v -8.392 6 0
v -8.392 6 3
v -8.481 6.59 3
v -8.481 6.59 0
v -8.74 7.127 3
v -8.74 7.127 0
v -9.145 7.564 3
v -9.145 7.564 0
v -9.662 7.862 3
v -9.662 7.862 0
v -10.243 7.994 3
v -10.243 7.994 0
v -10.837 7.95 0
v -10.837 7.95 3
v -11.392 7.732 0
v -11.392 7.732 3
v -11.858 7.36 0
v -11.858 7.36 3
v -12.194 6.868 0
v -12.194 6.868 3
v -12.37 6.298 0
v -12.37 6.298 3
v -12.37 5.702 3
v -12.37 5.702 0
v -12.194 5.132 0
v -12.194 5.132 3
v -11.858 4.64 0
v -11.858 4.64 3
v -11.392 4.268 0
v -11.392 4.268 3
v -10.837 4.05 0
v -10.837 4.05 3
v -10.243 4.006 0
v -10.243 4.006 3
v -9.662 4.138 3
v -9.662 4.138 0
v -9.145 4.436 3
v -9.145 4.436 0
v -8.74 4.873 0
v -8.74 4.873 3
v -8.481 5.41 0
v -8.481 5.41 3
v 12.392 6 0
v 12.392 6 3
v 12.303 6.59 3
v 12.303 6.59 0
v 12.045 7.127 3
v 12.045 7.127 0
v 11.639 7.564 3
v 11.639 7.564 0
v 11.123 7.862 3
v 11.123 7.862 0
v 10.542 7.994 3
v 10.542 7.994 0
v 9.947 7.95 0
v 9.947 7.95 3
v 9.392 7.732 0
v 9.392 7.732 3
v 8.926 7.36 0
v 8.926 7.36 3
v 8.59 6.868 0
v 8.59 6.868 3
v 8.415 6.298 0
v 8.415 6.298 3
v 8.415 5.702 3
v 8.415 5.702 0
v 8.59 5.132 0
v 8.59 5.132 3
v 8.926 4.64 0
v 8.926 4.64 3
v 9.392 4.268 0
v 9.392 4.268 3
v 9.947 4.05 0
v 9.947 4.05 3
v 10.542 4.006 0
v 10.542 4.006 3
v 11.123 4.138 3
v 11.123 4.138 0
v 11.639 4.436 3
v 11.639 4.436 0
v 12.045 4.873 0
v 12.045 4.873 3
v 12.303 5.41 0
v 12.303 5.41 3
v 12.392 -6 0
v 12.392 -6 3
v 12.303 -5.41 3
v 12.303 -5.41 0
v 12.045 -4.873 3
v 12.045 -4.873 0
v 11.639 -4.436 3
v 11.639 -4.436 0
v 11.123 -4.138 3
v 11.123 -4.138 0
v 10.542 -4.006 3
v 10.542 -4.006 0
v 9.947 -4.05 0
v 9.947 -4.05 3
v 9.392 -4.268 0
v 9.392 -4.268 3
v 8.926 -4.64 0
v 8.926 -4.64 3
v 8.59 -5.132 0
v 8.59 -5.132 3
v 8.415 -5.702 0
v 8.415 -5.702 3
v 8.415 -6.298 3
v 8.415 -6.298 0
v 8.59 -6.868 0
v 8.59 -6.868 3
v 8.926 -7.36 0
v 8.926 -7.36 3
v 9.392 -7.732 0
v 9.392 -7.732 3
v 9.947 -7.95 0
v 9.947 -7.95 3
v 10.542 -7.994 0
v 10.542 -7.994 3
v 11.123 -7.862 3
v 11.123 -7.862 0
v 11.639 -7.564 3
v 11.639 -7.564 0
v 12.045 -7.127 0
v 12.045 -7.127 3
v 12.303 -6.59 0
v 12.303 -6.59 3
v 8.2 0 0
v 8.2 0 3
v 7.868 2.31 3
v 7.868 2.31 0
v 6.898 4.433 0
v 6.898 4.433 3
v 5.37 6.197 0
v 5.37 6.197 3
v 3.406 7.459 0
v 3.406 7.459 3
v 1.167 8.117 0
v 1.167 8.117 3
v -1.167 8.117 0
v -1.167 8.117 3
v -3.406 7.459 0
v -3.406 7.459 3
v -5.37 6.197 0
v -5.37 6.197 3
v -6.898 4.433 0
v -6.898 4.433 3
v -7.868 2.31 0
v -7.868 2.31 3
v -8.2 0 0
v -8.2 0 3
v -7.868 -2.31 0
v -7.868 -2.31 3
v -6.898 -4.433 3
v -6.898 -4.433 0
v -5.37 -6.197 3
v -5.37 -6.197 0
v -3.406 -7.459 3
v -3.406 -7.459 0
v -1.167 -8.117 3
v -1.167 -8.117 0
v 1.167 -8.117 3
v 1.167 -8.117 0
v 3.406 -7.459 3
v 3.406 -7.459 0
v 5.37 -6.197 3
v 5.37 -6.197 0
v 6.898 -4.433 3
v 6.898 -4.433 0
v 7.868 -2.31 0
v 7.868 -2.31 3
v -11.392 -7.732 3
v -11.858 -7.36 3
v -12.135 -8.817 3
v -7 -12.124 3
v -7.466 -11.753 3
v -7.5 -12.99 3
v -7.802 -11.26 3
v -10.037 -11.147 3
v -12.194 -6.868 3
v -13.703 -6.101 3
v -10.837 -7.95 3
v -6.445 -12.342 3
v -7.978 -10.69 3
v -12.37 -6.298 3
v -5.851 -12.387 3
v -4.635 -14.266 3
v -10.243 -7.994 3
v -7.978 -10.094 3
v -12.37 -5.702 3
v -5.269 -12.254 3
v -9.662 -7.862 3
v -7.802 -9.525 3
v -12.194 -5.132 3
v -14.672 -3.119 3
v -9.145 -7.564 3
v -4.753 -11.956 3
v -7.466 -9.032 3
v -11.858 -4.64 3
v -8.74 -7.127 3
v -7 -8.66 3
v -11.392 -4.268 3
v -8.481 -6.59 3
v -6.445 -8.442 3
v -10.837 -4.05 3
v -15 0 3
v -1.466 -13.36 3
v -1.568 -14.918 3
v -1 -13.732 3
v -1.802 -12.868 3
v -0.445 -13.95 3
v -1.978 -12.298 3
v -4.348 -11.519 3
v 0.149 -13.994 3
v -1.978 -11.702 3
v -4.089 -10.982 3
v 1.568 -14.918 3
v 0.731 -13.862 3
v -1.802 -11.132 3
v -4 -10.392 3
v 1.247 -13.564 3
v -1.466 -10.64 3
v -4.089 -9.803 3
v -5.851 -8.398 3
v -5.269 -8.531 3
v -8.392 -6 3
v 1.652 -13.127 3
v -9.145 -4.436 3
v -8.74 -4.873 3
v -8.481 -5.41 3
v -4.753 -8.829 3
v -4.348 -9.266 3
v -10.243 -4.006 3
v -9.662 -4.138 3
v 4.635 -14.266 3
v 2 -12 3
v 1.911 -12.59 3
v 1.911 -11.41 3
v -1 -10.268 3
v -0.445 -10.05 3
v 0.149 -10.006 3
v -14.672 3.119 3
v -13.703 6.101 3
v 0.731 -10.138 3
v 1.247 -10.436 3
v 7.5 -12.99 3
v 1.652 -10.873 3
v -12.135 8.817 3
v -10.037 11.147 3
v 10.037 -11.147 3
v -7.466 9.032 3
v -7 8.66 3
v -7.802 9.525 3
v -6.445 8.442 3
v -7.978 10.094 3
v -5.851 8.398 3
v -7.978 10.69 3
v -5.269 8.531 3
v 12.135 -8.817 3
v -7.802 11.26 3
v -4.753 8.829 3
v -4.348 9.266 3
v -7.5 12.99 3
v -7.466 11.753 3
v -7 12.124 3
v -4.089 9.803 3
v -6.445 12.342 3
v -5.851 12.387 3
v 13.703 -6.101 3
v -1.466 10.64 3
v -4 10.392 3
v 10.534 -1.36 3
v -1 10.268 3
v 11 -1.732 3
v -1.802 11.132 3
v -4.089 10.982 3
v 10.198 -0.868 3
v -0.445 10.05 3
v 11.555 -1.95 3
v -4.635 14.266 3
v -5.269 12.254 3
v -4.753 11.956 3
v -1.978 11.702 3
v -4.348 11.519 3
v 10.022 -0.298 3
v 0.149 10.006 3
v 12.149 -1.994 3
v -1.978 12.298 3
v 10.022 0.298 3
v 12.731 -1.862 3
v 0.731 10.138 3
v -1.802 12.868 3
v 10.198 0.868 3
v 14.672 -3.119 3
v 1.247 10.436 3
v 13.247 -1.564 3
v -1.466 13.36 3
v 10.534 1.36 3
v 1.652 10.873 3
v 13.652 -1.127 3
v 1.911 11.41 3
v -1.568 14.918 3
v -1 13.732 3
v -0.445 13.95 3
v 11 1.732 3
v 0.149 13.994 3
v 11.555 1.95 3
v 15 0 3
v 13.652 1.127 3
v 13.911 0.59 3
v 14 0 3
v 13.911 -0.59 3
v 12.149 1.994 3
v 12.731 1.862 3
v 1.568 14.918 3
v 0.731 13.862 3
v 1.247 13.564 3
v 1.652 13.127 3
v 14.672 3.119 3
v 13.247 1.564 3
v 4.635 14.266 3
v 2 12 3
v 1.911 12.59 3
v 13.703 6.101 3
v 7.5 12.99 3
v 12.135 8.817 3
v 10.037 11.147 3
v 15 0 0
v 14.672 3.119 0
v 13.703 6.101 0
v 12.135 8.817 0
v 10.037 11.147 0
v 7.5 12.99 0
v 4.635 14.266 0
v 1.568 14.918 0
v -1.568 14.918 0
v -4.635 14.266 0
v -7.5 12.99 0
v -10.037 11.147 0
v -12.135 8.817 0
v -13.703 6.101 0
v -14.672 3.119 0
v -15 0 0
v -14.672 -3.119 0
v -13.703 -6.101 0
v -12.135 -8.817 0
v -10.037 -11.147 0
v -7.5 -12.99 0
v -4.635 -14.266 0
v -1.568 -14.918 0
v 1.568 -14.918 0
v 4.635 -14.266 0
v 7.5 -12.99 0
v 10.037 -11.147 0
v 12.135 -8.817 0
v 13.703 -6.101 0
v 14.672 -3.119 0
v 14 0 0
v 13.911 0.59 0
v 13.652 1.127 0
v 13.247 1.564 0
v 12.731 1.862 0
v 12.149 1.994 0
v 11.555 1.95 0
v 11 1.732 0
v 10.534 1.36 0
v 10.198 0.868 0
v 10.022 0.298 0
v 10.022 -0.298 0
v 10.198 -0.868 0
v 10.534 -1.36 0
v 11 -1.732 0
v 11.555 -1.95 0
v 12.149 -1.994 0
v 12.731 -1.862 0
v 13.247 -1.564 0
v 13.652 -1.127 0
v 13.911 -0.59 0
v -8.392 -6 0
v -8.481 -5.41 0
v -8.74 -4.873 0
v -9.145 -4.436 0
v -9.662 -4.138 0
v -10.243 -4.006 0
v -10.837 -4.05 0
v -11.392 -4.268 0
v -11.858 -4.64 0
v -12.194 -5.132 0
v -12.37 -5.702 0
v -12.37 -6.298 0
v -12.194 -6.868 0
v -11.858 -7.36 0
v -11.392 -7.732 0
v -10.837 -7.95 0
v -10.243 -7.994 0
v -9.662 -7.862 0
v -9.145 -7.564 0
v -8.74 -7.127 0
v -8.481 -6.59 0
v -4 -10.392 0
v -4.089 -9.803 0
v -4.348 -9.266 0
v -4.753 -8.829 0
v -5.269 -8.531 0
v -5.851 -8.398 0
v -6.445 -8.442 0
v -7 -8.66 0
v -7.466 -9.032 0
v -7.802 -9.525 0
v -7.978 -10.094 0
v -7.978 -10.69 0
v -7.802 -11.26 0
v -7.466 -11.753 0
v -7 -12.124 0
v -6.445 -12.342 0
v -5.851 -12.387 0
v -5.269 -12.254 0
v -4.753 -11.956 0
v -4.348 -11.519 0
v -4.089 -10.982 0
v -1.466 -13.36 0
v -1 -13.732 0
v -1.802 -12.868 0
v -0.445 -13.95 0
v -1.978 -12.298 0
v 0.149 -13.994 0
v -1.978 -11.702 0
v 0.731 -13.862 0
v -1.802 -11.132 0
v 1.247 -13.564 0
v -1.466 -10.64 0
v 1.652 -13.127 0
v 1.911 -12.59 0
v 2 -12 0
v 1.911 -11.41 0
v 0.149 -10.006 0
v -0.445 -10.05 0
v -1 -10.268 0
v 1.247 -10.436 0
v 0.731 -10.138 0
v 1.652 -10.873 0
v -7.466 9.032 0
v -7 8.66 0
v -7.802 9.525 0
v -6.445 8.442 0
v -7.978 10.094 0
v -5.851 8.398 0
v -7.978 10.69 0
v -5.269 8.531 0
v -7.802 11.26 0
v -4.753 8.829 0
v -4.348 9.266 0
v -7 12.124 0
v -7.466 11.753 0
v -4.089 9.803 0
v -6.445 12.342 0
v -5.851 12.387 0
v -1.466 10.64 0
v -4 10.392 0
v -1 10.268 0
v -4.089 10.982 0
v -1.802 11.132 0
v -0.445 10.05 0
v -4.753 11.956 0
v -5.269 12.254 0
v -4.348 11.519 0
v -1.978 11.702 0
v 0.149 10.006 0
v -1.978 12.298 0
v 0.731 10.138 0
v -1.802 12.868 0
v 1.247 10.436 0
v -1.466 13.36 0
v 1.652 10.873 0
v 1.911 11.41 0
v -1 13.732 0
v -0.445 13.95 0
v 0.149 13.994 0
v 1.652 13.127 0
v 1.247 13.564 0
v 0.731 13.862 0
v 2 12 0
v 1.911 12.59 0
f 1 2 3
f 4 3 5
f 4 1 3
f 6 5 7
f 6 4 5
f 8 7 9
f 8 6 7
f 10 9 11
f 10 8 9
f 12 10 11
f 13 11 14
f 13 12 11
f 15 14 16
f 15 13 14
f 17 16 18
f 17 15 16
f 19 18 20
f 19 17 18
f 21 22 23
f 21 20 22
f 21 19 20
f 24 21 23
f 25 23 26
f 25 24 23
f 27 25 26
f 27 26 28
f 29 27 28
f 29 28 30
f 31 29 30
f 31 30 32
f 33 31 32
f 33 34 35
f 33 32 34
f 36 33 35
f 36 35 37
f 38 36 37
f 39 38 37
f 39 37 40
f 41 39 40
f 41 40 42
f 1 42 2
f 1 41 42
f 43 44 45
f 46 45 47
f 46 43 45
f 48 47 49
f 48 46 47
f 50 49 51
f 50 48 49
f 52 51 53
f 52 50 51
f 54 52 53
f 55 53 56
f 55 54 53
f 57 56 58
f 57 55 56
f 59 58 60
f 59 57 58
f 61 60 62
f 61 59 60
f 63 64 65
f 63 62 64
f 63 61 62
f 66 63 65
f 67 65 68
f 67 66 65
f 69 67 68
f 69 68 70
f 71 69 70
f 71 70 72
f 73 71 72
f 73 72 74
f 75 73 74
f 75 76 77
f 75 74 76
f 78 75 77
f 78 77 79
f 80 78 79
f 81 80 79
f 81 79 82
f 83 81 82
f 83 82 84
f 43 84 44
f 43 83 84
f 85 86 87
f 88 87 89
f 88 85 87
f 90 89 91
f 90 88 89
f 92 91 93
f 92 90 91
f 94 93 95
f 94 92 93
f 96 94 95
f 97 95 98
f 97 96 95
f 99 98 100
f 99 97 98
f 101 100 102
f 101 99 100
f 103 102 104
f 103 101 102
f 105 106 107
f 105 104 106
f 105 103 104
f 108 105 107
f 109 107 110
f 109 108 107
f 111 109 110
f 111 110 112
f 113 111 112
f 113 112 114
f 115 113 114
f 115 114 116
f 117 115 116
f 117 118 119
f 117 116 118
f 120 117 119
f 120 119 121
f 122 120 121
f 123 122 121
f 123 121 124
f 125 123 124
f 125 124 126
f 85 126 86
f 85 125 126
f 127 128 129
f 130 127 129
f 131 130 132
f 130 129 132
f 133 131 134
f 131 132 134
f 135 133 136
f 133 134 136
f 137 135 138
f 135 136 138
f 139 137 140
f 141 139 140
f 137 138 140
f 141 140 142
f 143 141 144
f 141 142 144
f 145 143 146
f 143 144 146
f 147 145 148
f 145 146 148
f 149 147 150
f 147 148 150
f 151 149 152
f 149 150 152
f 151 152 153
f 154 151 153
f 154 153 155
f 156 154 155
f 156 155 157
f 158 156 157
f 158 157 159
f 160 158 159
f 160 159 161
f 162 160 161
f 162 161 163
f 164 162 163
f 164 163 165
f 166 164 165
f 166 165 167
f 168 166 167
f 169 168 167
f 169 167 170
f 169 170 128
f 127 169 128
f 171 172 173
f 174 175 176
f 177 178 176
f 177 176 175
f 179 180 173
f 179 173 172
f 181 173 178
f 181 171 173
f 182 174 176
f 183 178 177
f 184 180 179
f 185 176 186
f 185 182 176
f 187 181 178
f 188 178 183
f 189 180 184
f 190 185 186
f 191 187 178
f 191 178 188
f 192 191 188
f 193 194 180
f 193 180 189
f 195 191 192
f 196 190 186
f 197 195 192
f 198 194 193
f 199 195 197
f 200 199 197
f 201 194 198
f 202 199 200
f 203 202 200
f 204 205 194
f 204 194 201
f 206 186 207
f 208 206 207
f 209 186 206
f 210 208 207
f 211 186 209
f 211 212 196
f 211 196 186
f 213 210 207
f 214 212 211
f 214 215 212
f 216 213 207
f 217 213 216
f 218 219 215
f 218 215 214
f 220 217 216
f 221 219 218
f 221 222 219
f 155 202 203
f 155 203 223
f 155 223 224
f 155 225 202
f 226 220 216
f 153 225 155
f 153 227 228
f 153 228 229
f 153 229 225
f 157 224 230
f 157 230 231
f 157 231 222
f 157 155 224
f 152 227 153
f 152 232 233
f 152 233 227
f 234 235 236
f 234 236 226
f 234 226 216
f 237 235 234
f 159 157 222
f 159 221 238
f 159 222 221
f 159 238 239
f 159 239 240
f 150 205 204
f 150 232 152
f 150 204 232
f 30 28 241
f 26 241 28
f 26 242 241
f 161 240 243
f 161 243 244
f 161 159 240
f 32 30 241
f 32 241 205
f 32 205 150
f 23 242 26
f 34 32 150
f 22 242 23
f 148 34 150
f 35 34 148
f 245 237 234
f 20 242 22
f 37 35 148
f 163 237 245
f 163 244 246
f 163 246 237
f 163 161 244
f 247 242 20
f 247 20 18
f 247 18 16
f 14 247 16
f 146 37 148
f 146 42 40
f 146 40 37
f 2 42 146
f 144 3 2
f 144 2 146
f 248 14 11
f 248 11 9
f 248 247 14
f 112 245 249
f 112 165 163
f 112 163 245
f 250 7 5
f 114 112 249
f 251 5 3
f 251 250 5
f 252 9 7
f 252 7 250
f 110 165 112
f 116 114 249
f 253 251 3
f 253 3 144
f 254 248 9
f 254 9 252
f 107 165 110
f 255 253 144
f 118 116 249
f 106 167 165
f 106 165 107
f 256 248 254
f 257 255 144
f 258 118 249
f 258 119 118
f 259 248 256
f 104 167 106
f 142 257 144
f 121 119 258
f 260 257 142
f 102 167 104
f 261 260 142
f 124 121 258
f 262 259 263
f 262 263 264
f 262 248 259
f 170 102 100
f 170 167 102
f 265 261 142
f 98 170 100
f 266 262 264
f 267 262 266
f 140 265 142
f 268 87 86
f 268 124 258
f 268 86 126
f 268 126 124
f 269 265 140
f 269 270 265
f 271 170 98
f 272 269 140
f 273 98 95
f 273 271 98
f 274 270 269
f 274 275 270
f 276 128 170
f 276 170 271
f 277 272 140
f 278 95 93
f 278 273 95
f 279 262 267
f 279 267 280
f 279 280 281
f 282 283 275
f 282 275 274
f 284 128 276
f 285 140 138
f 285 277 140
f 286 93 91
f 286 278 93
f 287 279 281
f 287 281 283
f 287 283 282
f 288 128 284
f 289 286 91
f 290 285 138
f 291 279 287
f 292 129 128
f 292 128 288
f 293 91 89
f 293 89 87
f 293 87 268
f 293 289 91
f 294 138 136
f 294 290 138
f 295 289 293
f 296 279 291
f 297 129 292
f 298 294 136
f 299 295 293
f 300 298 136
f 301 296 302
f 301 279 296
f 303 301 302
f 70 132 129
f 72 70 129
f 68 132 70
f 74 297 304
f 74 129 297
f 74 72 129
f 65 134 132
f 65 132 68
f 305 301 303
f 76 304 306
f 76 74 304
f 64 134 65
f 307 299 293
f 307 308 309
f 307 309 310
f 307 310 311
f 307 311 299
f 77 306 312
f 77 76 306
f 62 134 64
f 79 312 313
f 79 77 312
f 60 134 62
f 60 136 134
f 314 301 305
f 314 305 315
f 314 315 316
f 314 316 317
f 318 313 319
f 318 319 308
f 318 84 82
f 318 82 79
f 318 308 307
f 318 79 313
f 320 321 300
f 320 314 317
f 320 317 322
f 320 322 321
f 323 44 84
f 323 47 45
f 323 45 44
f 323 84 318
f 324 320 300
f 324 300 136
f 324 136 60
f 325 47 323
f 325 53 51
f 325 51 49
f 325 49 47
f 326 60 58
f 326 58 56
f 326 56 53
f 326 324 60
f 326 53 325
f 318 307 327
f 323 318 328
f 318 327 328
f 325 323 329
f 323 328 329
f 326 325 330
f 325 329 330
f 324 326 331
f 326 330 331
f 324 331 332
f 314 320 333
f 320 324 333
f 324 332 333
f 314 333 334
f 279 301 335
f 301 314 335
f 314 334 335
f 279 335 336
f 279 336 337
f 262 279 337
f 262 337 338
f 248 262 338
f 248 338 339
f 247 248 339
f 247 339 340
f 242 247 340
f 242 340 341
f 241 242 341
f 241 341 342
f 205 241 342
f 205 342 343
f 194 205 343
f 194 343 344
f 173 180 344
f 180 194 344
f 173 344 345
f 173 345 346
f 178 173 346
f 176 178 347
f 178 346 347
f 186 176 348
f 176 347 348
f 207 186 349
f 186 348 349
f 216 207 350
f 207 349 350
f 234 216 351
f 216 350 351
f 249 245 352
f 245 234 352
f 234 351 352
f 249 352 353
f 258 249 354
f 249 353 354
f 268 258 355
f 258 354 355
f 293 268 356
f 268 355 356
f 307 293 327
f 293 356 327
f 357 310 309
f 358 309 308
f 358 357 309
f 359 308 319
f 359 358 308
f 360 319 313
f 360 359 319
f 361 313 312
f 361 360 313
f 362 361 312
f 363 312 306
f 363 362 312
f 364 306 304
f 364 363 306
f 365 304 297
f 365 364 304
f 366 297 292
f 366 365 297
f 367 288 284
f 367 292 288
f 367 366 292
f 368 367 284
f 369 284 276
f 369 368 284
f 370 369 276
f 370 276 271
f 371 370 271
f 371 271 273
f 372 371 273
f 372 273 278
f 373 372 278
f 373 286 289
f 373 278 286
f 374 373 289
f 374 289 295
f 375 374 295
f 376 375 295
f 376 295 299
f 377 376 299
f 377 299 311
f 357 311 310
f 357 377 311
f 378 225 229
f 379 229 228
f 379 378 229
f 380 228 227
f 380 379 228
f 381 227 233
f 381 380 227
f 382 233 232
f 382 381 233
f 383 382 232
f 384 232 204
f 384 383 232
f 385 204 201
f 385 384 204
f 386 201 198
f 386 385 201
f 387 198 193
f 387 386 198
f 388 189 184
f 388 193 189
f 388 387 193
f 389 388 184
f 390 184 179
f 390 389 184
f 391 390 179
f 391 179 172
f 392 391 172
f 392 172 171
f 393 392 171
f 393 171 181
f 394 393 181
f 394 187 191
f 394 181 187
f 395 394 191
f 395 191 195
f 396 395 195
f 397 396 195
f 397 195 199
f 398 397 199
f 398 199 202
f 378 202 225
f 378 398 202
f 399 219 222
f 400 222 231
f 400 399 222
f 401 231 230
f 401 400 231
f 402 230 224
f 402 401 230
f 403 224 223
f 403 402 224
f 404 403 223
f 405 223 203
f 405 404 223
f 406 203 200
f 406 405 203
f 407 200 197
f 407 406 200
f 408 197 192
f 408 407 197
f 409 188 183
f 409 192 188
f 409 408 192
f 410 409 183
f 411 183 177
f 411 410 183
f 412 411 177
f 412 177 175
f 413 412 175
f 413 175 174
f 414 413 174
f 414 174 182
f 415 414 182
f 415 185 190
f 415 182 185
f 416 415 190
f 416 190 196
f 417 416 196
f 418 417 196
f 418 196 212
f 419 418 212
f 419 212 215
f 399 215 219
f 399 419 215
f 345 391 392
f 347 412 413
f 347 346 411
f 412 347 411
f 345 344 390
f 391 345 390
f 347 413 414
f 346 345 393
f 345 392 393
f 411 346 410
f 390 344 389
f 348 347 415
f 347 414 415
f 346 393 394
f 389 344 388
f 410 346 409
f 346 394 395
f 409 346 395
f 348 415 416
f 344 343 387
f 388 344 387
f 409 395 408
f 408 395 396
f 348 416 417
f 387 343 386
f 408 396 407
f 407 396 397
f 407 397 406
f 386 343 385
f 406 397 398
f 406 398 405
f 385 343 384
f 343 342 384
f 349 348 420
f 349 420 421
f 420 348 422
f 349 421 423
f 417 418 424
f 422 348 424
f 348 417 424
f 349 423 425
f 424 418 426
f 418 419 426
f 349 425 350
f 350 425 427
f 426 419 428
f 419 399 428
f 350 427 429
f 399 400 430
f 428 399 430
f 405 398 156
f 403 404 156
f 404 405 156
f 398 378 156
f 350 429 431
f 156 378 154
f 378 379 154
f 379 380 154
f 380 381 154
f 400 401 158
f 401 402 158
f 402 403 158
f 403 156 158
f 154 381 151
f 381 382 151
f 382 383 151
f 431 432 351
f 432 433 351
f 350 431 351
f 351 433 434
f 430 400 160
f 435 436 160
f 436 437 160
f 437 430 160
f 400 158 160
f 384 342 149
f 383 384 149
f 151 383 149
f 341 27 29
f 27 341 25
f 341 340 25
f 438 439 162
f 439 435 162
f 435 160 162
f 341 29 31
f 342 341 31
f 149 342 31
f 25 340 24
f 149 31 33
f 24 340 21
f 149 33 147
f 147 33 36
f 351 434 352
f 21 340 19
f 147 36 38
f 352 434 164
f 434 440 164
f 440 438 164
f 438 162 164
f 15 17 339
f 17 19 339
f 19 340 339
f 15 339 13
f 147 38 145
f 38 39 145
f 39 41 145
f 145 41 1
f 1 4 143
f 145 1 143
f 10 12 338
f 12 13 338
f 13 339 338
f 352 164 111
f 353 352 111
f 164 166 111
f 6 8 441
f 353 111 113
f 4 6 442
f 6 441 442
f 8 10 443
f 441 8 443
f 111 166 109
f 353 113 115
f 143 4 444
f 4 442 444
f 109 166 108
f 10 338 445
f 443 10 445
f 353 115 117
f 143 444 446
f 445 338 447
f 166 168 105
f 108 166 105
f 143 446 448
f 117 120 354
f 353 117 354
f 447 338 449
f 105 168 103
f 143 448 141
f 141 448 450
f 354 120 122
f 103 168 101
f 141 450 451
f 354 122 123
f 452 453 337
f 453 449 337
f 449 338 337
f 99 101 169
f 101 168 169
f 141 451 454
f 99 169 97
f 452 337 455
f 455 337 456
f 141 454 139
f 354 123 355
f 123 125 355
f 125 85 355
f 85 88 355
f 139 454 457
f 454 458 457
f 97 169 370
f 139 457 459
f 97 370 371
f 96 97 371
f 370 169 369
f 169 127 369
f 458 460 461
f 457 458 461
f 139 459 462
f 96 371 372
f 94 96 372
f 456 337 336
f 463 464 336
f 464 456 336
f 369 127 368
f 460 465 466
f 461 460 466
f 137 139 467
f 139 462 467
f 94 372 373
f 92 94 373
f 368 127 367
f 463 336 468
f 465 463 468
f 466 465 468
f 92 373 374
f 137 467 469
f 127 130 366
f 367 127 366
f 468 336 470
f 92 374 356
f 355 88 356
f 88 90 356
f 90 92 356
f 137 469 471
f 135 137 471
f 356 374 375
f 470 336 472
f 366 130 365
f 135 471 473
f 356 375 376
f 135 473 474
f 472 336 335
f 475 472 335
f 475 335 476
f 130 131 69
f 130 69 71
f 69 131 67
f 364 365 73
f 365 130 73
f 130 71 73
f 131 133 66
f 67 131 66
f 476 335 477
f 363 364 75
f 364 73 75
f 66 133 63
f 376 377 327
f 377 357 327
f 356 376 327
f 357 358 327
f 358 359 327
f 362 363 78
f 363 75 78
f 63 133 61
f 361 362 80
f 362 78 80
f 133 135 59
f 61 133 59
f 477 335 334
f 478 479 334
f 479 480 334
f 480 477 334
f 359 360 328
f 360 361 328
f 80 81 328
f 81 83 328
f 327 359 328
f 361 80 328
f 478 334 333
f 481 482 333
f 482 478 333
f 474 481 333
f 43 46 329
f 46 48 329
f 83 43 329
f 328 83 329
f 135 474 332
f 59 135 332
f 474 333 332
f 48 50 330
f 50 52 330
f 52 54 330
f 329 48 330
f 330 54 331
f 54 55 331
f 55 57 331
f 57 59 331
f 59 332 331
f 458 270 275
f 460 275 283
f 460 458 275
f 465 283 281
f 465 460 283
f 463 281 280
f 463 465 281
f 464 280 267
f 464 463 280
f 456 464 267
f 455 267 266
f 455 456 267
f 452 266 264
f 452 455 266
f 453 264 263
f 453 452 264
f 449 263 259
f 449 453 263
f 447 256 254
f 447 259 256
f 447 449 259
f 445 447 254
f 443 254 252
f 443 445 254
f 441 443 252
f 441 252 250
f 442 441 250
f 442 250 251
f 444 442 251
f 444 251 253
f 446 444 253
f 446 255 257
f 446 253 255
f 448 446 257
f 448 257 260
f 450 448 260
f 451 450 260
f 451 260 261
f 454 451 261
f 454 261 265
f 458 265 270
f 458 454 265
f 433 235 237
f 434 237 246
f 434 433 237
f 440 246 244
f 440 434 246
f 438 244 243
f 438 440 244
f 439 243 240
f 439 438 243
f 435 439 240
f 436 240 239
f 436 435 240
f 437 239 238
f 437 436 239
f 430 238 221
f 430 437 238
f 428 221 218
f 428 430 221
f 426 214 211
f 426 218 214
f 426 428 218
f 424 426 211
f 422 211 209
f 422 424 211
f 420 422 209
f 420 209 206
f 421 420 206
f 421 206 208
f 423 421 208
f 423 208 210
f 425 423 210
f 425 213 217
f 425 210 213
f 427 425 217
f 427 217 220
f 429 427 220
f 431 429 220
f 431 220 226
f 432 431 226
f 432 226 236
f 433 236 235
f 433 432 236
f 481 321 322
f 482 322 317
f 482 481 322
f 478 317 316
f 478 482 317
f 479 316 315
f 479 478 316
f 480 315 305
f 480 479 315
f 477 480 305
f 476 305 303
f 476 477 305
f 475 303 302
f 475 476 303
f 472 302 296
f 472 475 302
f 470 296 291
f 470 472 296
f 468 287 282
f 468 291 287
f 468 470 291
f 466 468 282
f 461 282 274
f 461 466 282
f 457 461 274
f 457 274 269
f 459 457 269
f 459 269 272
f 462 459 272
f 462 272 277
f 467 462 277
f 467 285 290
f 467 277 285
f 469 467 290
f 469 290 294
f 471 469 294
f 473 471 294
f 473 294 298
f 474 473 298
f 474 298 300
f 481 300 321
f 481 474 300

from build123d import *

# Parameters (mm, degrees)
SKETCH_1_R          = 15
SKETCH_1_R_2        = 2
SKETCH_1_R_3        = 5
EXTRUDE_1_DEPTH     = 7
SKETCH_2_R          = 8
SKETCH_2_R_2        = 5
EXTRUDE_2_DEPTH     = 70
SKETCH_3_R          = 2.5
CUT_EXTRUDE_1_DEPTH = 10
CUT_EXTRUDE_START   = -4
SKETCH_4_R          = 18.074037985
SKETCH_4_R_2        = 8
CUT_EXTRUDE_2_DEPTH = 4
SKETCH_5_R          = 8.2
CUT_EXTRUDE_3_DEPTH = 90


with BuildPart() as part:
    # 草图1 → 凸台-拉伸1 (new body)
    with BuildSketch(Plane.XY):
        Circle(SKETCH_1_R)
        with Locations((0, 12)):
            Circle(SKETCH_1_R_2, mode=Mode.SUBTRACT)
        with Locations((10.392304845, 6)):
            Circle(SKETCH_1_R_2, mode=Mode.SUBTRACT)
        with Locations((10.392304845, -6)):
            Circle(SKETCH_1_R_2, mode=Mode.SUBTRACT)
        with Locations((0, -12)):
            Circle(SKETCH_1_R_2, mode=Mode.SUBTRACT)
        with Locations((-10.392304845, -6)):
            Circle(SKETCH_1_R_2, mode=Mode.SUBTRACT)
        with Locations((-10.392304845, 6)):
            Circle(SKETCH_1_R_2, mode=Mode.SUBTRACT)
        with Locations((-6, 10.392304845)):
            Circle(SKETCH_1_R_2, mode=Mode.SUBTRACT)
        with Locations((12, 0)):
            Circle(SKETCH_1_R_2, mode=Mode.SUBTRACT)
        with Locations((-6, -10.392304845)):
            Circle(SKETCH_1_R_2, mode=Mode.SUBTRACT)
        Circle(SKETCH_1_R_3, mode=Mode.SUBTRACT)
    extrude(amount=EXTRUDE_1_DEPTH)

    # 草图2 → 凸台-拉伸2 (add)
    with BuildSketch(Plane.XY.offset(7)):
        Circle(SKETCH_2_R)
        Circle(SKETCH_2_R_2, mode=Mode.SUBTRACT)
    extrude(amount=EXTRUDE_2_DEPTH)

    # 草图3 → 切除-拉伸1 (cut)
    with BuildSketch(Plane(origin=(0, 0, 0), x_dir=(1, 0, 0), z_dir=(0, 1, 0))):
        with Locations(Location((0.676832819, -59, 0), (0, 0, 270))):
            Circle(SKETCH_3_R)
    extrude(amount=-CUT_EXTRUDE_1_DEPTH, mode=Mode.SUBTRACT)

    # 草图4 → 切除-拉伸2 (cut)
    with BuildSketch(Plane.XY.offset(7).offset(CUT_EXTRUDE_START)):
        Circle(SKETCH_4_R)
        Circle(SKETCH_4_R_2, mode=Mode.SUBTRACT)
    extrude(amount=CUT_EXTRUDE_2_DEPTH, mode=Mode.SUBTRACT)

    # 草图5 → 切除-拉伸3 (cut)
    with BuildSketch(Plane.XY.offset(77)):
        Circle(SKETCH_5_R)
    extrude(amount=-CUT_EXTRUDE_3_DEPTH, mode=Mode.SUBTRACT)


solid = part.part
